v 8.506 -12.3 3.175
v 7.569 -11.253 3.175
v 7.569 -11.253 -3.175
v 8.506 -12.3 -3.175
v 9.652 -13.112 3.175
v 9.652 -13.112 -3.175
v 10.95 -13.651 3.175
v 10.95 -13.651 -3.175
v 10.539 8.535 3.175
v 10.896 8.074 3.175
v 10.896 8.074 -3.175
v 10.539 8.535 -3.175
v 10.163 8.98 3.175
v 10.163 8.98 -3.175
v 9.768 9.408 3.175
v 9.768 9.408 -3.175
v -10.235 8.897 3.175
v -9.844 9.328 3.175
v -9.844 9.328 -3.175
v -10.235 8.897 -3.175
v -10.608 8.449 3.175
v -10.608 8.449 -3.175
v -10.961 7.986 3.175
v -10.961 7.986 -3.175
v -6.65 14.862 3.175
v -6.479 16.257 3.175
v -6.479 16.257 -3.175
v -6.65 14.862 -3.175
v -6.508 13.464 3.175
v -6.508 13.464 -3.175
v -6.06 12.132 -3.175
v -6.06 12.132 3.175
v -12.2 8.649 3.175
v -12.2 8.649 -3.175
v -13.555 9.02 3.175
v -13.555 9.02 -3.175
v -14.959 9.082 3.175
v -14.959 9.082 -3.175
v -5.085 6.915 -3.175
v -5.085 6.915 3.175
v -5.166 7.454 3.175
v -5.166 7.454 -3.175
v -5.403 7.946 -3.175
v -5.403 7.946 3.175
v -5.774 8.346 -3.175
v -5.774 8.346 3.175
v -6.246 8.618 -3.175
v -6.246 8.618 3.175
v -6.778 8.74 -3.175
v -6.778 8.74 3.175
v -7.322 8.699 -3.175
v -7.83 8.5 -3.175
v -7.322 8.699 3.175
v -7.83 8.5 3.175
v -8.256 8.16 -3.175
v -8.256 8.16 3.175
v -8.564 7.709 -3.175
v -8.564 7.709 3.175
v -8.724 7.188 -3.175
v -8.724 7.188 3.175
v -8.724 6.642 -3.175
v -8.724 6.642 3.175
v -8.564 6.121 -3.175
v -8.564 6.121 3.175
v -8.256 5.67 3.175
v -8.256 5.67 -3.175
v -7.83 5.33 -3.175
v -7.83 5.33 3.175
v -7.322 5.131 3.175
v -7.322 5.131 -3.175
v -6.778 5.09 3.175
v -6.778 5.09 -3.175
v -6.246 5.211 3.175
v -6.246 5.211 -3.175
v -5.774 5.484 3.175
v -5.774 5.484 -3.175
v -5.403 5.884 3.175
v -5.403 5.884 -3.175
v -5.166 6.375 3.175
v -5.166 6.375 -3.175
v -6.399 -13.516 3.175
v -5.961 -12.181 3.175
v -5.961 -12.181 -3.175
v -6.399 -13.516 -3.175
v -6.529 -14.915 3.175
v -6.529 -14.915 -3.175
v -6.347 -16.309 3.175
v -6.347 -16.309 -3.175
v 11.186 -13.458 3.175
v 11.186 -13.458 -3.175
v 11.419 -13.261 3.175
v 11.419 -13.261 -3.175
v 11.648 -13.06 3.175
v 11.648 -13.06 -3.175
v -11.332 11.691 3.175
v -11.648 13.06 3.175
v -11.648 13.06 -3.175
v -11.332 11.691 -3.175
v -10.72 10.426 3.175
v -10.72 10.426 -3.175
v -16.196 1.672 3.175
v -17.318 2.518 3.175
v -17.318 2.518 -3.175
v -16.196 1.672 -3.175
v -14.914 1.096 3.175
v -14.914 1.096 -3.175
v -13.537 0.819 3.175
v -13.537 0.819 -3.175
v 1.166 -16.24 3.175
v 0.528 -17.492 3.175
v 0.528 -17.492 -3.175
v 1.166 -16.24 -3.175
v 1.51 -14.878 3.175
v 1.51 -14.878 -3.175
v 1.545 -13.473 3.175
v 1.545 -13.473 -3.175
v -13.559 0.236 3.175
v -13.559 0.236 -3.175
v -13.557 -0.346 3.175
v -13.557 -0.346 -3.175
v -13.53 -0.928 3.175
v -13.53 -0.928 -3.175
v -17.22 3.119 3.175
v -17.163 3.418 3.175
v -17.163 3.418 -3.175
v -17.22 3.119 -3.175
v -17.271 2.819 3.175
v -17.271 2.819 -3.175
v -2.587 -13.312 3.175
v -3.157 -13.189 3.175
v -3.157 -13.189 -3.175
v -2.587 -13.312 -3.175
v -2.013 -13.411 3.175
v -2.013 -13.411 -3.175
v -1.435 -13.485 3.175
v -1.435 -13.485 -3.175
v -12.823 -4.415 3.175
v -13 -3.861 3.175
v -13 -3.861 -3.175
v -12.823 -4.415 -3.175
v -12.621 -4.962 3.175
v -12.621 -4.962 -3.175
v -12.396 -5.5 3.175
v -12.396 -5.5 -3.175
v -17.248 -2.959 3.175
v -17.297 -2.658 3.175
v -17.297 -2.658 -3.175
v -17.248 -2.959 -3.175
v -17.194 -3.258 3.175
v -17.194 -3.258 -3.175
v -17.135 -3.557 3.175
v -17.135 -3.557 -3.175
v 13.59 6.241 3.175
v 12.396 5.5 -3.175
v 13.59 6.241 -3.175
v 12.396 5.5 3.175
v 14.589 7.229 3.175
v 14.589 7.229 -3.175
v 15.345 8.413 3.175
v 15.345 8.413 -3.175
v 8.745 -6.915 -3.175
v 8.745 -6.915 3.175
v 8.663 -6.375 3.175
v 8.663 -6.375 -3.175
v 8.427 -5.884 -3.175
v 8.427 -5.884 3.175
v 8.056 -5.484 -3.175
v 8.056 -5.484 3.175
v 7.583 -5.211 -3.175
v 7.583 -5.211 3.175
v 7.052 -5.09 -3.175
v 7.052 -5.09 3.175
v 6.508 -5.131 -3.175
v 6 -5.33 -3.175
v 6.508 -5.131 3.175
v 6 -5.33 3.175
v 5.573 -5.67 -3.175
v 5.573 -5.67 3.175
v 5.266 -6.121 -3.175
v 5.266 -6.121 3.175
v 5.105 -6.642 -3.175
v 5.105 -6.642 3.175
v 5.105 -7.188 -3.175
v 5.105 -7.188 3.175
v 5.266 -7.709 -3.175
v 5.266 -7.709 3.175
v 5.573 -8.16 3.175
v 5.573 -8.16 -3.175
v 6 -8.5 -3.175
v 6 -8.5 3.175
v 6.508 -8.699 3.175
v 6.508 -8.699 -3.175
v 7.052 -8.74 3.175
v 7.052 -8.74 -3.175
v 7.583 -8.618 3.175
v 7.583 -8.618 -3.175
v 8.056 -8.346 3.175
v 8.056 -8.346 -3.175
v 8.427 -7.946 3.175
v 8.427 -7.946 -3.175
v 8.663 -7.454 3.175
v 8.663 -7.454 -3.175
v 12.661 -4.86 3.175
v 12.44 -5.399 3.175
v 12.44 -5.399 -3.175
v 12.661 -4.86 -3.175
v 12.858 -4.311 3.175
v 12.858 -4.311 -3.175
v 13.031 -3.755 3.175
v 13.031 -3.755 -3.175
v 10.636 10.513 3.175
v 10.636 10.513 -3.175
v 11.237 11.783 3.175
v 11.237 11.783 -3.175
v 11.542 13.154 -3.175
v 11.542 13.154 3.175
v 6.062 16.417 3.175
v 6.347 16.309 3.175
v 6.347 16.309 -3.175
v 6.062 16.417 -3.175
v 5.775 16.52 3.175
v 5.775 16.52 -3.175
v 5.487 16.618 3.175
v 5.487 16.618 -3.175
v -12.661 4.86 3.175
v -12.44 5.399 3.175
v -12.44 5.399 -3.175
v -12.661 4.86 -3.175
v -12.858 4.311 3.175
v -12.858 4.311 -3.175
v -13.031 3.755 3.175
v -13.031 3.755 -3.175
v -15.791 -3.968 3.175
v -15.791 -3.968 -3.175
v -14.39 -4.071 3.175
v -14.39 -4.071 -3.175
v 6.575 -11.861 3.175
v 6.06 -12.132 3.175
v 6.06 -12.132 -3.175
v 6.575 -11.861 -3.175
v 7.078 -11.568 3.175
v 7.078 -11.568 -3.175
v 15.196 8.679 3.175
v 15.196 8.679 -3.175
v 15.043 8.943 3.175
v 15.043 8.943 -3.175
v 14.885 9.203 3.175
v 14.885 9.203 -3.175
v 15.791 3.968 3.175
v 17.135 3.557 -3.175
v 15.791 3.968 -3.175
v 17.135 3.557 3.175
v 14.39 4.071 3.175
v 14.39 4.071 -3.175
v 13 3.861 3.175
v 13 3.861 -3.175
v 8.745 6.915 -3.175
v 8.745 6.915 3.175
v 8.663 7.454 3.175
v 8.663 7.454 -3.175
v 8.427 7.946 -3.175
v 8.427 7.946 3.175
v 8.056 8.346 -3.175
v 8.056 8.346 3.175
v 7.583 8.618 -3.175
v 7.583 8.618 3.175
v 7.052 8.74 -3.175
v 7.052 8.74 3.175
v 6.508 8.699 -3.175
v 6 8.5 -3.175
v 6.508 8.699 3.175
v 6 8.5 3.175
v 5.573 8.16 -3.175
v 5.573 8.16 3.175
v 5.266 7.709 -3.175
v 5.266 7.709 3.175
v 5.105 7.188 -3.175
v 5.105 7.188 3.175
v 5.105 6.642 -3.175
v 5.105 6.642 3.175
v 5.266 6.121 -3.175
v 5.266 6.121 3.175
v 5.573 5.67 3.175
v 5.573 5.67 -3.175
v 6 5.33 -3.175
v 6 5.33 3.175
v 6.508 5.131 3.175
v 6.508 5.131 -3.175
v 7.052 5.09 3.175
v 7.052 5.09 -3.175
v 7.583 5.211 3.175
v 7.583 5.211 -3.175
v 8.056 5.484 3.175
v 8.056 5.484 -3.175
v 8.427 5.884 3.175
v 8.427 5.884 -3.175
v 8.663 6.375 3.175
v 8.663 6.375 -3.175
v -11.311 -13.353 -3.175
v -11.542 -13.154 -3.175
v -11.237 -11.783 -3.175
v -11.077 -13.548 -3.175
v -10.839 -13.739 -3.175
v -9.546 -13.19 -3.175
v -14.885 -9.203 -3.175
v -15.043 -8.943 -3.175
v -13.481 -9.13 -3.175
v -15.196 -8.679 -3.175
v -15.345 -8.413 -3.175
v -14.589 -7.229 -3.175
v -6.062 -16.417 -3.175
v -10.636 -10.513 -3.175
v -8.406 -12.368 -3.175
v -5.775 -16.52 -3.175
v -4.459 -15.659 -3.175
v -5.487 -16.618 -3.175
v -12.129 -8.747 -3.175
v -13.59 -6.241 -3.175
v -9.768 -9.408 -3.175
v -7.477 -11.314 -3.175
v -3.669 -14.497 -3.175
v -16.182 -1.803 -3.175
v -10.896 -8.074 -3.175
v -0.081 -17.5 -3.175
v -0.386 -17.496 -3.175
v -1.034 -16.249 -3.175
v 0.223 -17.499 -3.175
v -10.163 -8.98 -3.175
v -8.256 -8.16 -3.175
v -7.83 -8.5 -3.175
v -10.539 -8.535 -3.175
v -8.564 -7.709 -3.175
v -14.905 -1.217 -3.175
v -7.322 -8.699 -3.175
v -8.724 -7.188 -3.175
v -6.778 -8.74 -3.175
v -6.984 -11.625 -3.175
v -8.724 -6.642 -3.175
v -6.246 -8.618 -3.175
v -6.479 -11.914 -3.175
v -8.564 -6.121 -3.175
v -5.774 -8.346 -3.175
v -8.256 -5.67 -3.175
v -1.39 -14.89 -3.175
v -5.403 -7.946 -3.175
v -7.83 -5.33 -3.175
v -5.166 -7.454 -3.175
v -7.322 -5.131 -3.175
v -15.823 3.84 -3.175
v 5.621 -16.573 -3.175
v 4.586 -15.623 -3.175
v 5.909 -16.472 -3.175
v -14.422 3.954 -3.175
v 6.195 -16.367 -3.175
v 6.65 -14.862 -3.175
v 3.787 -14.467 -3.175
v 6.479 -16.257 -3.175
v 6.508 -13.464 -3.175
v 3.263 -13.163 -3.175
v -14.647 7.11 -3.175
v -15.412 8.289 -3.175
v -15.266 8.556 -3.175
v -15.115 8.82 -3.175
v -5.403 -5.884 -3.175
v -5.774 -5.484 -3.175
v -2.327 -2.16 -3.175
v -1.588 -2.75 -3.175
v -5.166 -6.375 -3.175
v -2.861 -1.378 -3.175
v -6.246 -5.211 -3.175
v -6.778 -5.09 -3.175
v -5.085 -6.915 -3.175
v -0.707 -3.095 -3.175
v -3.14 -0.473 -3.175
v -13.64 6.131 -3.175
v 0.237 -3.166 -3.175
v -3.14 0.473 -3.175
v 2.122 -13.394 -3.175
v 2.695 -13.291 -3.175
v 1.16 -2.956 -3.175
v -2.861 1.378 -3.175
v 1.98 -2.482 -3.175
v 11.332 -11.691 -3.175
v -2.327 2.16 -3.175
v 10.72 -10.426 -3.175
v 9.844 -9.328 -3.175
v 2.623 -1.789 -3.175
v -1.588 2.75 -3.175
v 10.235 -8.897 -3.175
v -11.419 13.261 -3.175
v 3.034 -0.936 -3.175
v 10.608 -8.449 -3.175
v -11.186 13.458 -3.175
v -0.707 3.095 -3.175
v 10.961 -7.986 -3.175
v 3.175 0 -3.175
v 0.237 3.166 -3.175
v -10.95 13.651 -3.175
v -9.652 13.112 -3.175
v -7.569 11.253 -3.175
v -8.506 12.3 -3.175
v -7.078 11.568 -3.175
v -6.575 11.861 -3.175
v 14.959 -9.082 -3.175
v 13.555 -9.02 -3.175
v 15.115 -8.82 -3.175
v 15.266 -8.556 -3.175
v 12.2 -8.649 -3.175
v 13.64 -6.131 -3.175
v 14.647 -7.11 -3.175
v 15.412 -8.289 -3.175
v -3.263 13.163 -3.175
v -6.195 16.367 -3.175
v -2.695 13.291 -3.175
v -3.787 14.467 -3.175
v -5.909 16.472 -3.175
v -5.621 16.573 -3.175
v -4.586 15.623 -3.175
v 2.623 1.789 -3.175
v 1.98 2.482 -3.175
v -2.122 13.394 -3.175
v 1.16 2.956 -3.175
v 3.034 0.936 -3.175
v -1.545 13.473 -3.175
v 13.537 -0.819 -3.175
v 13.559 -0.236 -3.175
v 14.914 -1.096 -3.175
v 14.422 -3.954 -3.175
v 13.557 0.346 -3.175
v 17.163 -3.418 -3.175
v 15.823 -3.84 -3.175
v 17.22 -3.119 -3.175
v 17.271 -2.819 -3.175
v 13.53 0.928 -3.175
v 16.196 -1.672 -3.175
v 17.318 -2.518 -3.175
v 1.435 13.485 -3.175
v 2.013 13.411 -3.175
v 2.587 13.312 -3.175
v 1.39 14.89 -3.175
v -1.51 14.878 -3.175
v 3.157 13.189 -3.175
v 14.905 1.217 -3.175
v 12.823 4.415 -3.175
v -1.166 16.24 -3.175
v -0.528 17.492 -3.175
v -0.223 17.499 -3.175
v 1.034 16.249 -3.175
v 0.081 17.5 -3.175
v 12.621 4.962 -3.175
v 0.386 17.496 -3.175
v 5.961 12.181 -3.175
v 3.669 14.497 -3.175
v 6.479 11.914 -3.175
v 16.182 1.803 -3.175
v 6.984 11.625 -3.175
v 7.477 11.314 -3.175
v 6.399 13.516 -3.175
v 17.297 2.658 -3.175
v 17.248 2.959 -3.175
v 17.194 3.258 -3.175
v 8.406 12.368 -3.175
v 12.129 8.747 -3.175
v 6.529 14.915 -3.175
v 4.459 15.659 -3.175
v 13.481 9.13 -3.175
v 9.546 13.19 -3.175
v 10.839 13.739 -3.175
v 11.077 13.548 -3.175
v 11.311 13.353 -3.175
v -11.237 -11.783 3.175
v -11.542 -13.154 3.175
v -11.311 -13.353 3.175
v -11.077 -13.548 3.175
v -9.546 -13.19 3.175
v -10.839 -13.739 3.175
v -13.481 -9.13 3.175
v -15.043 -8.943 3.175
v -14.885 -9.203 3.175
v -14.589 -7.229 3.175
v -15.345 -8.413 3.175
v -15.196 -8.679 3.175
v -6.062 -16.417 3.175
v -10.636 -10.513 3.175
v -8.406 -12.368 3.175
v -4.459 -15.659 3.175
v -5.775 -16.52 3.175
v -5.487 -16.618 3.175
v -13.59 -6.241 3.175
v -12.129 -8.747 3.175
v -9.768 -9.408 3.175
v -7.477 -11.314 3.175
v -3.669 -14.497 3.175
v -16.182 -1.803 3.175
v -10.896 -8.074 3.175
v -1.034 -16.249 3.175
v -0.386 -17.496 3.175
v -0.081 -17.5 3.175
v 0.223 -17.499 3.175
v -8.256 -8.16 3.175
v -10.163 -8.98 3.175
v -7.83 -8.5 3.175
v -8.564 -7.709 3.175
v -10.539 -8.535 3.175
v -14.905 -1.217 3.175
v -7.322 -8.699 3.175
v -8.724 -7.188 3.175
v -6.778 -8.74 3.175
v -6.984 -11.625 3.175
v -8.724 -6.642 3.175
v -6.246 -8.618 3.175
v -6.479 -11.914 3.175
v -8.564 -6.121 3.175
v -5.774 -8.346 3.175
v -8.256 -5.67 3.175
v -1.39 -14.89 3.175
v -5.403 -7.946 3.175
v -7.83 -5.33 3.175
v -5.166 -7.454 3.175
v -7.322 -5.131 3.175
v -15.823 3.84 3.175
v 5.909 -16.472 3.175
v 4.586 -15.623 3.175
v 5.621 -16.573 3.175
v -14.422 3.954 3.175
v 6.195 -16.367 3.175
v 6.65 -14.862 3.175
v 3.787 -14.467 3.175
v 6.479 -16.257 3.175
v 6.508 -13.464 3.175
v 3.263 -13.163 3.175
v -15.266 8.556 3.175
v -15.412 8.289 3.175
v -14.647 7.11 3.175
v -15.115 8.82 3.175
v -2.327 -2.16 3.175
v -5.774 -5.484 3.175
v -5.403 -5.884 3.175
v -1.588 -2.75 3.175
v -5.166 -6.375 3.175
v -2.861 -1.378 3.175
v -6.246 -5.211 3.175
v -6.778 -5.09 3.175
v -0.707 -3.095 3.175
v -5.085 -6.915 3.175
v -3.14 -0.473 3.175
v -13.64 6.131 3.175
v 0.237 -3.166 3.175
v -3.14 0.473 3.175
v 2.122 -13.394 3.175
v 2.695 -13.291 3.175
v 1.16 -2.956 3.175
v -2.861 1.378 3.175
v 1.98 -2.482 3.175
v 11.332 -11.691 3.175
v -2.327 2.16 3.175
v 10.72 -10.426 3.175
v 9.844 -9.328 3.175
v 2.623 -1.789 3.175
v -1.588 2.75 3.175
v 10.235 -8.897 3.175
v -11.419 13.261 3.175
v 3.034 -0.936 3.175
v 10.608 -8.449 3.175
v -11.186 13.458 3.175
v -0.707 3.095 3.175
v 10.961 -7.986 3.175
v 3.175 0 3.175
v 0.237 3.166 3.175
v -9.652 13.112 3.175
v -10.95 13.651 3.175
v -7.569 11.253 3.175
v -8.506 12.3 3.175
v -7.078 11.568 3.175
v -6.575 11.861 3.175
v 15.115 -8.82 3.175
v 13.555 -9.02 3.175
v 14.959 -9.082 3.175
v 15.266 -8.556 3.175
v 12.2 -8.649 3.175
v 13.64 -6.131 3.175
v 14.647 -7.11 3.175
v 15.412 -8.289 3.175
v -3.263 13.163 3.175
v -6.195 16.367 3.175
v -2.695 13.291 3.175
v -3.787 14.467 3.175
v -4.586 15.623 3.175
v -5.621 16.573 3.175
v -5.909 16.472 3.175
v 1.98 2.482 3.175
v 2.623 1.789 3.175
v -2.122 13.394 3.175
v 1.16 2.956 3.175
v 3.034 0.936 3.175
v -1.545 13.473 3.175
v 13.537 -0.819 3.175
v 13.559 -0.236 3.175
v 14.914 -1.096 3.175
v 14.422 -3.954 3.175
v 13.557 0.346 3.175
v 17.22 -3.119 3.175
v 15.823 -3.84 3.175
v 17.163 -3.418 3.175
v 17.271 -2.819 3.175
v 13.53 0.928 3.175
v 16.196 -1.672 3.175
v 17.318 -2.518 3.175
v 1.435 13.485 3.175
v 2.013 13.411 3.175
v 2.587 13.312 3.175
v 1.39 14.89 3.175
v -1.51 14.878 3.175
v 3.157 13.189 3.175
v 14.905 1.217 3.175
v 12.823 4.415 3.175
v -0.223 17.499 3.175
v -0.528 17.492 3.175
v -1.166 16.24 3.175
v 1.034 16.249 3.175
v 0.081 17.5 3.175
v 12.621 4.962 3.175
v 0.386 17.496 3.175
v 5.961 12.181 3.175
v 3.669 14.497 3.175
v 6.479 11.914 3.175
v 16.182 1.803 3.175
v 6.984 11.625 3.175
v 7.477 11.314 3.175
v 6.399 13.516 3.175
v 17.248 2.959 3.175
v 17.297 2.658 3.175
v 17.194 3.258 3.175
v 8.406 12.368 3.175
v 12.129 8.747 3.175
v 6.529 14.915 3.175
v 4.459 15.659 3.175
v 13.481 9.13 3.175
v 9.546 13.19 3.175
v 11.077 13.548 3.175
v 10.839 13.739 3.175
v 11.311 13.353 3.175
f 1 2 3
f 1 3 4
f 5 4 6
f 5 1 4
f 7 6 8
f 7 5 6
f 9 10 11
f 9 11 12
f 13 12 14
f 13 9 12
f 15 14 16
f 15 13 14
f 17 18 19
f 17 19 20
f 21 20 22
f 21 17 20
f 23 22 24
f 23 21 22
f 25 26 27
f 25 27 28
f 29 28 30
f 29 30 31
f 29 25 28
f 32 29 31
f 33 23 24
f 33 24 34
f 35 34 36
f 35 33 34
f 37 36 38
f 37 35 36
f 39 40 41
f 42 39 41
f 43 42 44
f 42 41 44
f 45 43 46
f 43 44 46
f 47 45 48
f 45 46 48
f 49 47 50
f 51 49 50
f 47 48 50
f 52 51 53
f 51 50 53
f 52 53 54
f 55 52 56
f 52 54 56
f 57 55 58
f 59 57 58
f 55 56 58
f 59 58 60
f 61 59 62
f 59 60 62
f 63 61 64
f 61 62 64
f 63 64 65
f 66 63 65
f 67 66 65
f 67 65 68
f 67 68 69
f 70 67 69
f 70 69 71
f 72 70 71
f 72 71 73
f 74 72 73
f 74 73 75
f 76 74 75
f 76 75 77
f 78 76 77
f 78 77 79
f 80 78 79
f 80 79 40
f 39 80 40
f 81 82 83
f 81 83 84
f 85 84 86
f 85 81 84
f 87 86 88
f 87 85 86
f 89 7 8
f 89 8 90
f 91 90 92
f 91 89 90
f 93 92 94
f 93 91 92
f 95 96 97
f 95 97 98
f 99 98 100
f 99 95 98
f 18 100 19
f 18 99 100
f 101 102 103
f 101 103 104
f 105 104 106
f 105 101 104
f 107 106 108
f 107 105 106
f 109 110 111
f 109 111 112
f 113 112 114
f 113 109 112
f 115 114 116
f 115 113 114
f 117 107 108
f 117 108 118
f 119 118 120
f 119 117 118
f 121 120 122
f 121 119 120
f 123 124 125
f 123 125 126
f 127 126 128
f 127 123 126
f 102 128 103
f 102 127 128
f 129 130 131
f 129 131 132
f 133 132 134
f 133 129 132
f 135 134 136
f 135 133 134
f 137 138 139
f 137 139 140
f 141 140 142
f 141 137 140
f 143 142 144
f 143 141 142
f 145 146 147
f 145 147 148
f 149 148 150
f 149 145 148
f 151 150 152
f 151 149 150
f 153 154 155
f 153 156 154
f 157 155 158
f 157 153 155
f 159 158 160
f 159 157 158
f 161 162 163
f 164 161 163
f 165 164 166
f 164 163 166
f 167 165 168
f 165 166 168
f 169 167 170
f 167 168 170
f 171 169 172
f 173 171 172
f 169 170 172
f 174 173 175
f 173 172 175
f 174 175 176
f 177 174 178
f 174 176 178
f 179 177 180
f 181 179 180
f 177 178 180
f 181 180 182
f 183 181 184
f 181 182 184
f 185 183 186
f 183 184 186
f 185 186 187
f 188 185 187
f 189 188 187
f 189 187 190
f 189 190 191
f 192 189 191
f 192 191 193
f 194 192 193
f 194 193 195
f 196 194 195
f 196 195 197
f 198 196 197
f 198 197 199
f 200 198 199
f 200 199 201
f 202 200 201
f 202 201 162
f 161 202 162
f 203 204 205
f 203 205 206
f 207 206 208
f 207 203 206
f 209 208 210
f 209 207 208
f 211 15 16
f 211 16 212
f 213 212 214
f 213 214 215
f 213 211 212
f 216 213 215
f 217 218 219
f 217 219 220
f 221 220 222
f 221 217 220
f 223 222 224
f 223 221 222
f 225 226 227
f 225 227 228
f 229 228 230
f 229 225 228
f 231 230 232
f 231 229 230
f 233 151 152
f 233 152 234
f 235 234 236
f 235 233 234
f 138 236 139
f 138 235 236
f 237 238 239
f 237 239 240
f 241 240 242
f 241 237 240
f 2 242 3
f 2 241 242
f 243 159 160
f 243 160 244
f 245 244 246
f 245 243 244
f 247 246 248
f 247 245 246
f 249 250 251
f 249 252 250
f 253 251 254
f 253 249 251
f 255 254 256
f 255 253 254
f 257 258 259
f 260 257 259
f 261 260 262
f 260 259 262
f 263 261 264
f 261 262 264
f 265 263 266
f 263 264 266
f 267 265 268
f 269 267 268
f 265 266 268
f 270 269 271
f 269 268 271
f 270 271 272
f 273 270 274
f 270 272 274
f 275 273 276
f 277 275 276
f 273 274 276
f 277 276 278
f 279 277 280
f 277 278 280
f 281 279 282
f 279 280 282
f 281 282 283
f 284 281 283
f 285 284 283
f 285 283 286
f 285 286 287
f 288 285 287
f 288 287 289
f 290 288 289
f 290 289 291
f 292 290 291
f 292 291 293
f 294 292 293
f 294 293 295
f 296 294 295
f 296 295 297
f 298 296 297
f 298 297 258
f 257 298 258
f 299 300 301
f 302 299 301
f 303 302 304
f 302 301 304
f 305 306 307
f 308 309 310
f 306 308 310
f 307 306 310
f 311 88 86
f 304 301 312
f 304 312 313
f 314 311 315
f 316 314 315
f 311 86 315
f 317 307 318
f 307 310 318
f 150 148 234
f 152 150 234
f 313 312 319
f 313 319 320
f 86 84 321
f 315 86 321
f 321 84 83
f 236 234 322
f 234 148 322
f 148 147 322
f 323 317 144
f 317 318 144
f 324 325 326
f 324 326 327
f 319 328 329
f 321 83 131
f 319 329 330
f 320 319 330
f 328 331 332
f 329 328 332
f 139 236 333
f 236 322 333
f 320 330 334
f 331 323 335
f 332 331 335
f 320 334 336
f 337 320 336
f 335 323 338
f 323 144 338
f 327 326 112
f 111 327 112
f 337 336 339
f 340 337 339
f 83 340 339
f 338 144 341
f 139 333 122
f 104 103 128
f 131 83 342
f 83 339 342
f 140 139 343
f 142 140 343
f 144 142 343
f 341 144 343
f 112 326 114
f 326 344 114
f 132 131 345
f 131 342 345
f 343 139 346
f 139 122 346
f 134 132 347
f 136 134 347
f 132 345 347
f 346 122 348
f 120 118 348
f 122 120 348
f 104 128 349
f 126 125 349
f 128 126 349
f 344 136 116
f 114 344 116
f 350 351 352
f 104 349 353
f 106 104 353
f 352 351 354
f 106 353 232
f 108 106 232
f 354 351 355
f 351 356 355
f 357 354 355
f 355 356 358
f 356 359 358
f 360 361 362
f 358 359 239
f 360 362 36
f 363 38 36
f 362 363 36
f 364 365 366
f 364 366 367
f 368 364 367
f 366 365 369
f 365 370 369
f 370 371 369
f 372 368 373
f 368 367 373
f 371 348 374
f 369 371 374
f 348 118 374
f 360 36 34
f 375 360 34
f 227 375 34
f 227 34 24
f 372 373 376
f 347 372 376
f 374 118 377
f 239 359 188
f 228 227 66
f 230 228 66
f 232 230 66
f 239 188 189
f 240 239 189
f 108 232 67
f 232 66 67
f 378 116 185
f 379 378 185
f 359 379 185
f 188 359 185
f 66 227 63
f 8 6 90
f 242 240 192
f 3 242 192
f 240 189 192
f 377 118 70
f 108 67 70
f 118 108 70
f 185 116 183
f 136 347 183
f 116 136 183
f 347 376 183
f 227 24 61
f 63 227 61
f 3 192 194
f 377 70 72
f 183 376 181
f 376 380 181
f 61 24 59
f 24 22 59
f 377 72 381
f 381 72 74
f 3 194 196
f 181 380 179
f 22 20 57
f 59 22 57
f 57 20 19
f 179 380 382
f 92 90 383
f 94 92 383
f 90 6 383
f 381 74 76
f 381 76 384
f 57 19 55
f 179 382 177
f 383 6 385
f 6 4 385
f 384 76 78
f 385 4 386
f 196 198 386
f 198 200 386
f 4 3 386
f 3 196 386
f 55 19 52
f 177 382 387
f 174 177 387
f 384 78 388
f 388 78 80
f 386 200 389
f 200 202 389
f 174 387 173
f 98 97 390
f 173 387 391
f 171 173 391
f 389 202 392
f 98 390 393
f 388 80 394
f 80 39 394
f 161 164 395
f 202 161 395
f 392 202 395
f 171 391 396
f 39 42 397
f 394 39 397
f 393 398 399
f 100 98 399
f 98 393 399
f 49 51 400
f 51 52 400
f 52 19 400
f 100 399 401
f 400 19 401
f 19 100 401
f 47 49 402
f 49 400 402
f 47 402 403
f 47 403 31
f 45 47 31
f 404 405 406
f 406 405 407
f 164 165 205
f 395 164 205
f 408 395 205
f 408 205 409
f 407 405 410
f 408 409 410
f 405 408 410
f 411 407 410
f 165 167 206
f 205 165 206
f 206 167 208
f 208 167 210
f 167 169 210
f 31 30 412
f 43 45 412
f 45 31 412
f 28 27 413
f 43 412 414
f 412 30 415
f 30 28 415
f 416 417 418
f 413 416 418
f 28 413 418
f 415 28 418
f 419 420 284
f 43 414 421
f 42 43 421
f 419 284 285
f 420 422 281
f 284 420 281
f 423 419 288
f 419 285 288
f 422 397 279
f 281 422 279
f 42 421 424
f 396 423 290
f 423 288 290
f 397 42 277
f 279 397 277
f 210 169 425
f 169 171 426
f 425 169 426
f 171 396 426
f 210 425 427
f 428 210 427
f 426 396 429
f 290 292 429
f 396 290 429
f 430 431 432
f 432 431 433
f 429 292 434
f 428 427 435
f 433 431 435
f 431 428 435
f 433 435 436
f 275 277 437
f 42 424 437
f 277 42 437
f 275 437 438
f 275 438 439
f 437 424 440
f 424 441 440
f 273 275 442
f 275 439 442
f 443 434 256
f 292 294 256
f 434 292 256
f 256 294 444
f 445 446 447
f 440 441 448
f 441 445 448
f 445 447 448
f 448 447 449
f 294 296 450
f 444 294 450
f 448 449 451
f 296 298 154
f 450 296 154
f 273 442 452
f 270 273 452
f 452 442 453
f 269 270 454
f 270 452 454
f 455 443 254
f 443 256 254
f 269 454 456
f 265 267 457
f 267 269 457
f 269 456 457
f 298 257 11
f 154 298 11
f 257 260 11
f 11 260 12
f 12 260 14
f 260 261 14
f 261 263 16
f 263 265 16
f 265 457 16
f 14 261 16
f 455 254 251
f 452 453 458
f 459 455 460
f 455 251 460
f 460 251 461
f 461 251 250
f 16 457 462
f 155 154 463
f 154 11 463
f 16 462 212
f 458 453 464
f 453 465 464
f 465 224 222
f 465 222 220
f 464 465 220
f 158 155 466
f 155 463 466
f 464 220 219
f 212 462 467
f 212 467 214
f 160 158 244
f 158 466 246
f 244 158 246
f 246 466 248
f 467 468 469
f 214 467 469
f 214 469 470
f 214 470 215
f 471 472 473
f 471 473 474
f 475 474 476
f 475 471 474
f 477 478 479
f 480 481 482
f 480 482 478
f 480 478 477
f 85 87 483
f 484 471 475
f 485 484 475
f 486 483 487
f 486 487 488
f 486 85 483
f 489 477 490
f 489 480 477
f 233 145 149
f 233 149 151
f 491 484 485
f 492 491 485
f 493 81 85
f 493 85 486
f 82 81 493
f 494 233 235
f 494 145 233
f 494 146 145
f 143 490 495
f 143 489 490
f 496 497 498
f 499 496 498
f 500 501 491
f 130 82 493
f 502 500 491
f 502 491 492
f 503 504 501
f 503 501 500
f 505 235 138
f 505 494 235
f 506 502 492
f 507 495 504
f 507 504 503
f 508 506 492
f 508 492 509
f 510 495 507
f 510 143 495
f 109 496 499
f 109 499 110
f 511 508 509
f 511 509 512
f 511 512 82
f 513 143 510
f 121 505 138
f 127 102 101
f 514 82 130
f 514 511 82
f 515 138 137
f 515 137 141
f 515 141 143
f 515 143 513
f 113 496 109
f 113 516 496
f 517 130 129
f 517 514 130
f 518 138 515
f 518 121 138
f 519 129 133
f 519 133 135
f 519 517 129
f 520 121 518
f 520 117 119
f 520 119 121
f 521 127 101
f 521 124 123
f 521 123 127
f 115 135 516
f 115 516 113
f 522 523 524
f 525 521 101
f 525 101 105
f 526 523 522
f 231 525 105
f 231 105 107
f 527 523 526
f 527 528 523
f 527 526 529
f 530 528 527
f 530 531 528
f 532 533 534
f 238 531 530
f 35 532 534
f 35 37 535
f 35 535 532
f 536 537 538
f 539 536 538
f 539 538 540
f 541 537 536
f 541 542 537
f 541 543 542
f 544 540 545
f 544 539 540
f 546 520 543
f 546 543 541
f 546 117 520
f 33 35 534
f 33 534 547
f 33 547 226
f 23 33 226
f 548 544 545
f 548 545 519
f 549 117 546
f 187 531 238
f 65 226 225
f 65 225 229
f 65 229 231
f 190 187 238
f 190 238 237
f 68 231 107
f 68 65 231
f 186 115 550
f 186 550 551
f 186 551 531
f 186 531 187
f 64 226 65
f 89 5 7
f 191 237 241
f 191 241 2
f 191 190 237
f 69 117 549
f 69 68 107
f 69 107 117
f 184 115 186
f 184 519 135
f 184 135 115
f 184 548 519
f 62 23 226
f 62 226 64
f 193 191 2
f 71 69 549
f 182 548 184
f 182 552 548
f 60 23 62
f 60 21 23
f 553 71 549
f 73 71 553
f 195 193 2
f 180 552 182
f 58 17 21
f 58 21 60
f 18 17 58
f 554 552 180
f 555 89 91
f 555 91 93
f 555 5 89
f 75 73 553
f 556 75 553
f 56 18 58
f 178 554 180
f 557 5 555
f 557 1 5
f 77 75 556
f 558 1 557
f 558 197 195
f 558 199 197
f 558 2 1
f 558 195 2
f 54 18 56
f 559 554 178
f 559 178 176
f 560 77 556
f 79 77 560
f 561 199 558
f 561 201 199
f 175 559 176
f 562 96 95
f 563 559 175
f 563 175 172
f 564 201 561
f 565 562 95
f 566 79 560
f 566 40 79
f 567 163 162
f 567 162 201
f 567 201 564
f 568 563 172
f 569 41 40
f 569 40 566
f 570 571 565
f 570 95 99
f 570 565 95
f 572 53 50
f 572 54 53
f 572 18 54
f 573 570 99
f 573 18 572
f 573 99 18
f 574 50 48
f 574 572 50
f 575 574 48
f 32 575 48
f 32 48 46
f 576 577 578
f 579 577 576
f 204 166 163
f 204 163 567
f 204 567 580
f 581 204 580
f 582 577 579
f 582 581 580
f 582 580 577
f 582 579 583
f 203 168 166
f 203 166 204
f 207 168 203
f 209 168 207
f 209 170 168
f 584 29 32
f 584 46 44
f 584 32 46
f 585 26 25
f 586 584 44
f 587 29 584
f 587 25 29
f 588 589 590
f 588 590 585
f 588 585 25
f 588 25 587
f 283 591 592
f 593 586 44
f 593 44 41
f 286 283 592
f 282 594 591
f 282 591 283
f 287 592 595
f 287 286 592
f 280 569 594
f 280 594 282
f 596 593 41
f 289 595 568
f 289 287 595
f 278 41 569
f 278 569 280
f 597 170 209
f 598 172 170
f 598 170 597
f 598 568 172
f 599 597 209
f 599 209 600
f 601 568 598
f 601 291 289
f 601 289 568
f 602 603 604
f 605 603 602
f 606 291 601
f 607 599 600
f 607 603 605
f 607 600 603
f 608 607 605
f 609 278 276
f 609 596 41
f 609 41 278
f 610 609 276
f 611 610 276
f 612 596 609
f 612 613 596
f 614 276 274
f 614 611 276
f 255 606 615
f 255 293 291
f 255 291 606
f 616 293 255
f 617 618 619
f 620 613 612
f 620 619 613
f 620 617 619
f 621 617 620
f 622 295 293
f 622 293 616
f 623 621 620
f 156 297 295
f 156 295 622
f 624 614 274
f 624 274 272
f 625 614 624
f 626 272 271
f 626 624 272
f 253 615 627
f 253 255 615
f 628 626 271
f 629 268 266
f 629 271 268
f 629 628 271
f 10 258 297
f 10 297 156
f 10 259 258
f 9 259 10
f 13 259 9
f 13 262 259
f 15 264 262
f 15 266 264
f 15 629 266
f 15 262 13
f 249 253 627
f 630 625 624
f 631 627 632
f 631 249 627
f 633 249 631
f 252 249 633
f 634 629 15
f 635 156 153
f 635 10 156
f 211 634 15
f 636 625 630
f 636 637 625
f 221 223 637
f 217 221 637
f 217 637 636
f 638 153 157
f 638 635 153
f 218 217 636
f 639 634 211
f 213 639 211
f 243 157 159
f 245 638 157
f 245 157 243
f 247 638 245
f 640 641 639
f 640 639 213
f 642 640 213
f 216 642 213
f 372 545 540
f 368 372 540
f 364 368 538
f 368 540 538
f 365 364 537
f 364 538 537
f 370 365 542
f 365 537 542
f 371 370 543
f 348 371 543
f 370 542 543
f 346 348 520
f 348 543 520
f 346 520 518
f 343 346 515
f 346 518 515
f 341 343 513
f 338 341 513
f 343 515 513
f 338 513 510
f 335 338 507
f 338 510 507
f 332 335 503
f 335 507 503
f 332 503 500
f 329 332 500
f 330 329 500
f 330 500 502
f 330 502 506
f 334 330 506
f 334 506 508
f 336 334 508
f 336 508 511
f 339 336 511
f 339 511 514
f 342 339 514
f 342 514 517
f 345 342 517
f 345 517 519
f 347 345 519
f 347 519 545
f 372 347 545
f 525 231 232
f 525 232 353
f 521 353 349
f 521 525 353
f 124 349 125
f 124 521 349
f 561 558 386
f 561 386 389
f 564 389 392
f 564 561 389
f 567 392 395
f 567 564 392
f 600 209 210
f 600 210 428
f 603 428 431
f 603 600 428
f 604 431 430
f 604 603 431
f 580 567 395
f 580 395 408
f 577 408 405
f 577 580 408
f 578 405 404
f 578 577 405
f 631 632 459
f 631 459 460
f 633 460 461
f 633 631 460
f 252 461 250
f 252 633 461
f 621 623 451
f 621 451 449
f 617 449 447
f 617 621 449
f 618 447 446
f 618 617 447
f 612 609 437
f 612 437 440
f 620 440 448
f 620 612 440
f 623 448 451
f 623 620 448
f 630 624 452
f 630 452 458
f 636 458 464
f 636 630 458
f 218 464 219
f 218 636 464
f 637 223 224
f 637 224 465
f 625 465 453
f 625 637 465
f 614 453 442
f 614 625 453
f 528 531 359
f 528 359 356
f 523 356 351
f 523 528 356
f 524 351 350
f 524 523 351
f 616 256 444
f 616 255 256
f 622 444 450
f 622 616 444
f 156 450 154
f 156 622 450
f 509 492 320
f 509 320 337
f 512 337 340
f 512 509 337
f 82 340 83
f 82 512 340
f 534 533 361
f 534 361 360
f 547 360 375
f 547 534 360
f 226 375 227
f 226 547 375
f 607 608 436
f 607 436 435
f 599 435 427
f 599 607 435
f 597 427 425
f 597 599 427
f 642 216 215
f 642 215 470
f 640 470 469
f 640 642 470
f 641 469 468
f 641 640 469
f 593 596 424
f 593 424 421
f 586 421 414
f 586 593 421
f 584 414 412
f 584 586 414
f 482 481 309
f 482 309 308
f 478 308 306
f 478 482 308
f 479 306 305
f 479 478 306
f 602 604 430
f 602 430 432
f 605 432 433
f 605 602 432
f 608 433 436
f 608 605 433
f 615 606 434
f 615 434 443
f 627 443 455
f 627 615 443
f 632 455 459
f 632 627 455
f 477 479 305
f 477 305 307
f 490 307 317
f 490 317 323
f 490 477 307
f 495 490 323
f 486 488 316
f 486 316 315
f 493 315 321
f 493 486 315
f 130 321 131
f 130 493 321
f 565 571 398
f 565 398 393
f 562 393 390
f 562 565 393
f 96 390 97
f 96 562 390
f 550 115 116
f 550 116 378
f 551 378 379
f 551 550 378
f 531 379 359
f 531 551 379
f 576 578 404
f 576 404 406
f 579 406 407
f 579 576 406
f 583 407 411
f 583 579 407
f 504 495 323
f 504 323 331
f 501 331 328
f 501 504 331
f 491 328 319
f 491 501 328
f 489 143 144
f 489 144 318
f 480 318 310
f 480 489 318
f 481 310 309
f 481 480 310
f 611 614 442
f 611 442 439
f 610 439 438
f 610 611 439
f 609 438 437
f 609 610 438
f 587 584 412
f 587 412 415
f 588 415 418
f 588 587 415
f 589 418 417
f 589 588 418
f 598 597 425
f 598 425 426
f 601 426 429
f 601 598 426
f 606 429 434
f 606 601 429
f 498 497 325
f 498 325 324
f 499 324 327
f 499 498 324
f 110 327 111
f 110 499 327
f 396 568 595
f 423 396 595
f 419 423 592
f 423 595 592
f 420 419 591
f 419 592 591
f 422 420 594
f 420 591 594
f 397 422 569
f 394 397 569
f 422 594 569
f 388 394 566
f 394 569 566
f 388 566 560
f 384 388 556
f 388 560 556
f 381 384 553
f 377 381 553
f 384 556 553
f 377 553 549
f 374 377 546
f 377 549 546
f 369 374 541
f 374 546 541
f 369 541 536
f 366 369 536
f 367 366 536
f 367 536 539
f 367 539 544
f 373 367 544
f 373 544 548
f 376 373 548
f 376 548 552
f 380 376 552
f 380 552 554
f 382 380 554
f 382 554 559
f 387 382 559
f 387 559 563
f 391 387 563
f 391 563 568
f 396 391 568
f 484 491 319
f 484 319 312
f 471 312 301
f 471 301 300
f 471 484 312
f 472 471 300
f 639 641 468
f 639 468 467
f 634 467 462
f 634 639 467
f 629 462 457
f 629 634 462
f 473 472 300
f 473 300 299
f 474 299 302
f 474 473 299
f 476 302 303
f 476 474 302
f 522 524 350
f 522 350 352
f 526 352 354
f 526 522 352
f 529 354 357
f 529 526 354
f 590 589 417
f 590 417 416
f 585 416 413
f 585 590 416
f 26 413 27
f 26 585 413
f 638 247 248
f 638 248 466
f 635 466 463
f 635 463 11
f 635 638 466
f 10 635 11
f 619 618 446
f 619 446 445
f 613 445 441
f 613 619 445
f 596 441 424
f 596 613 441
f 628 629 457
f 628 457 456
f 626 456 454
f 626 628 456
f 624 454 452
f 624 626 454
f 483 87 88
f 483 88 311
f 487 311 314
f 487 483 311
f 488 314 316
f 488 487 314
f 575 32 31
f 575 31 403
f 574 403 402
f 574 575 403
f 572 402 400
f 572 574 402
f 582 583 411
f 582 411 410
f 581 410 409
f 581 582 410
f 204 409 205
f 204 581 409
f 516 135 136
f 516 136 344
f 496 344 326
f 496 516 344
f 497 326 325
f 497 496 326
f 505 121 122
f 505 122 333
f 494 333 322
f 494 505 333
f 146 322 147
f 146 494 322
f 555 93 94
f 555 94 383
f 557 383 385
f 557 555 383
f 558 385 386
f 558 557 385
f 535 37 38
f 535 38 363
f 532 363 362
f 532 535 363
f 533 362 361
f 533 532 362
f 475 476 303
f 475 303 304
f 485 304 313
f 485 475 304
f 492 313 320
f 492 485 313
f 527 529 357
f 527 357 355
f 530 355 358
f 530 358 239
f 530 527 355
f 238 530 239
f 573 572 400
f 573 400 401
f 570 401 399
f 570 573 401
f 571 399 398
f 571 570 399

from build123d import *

# Parameters (mm, degrees)
BOSS_EXTRU_1_DEPTH = 3.175
ESQUISSE2_R        = 3.175
ESQUISSE2_R_2      = 1.83
CUT_EXTRUDE1_DEPTH = 26.426049992


with BuildPart() as part:
    # Esquisse1 → Boss.-Extru.1 (new, symmetric)
    with BuildSketch(Plane.XY):
        with BuildLine():
            ThreePointArc((12.39632517, 5.499582215), (14.117106651, 6.707055833), (15.344833887, 8.413445964))
            ThreePointArc((15.344833887, 8.413445964), (15.119886604, 8.811301214), (14.884626197, 9.203146363))
            ThreePointArc((14.884626197, 9.203146363), (12.79475517, 8.97616501), (10.895903967, 8.074252844))
            ThreePointArc((10.895903967, 8.074252844), (10.353325809, 8.759162457), (9.767767389, 9.407709736))
            ThreePointArc((9.767767389, 9.407709736), (10.97179275, 11.130905713), (11.541859176, 13.154295373))
            ThreePointArc((11.541859176, 13.154295373), (11.194403365, 13.451220514), (10.839311962, 13.73897071))
            ThreePointArc((10.839311962, 13.73897071), (8.953107774, 12.81090002), (7.47724344, 11.313934452))
            ThreePointArc((7.47724344, 11.313934452), (6.733133864, 11.771966302), (5.961072705, 12.18112862))
            ThreePointArc((5.961072705, 12.18112862), (6.503118716, 14.21220409), (6.346765909, 16.308542623))
            ThreePointArc((6.346765909, 16.308542623), (5.918709868, 16.4687241), (5.486616734, 16.617672425))
            ThreePointArc((5.486616734, 16.617672425), (4.031583448, 15.100451419), (3.156717001, 13.18898859))
            ThreePointArc((3.156717001, 13.18898859), (2.300826605, 13.364897275), (1.435384677, 13.485323618))
            ThreePointArc((1.435384677, 13.485323618), (1.25007259, 15.579300904), (0.386159005, 17.495738945))
            ThreePointArc((0.386159005, 17.495738945), (-0.07086739, 17.499856508), (-0.527845446, 17.492037594))
            ThreePointArc((-0.527845446, 17.492037594), (-1.376209343, 15.568665517), (-1.544556096, 13.473256055))
            ThreePointArc((-1.544556096, 13.473256055), (-2.408994299, 13.345824393), (-3.263431928, 13.162989565))
            ThreePointArc((-3.263431928, 13.162989565), (-4.15375074, 15.067304103), (-5.621024374, 16.57269094))
            ThreePointArc((-5.621024374, 16.57269094), (-6.051896994, 16.420247951), (-6.478641676, 16.256604874))
            ThreePointArc((-6.478641676, 16.256604874), (-6.618010975, 14.159068786), (-6.059532932, 12.132449995))
            ThreePointArc((-6.059532932, 12.132449995), (-6.828254938, 11.717048125), (-7.568630479, 11.253004706))
            ThreePointArc((-7.568630479, 11.253004706), (-9.056570428, 12.737968057), (-10.950229256, 13.650731821))
            ThreePointArc((-10.950229256, 13.650731821), (-11.302978505, 13.360115154), (-11.648018105, 13.060385685))
            ThreePointArc((-11.648018105, 13.060385685), (-11.061582813, 11.041679393), (-9.843640668, 9.328291411))
            ThreePointArc((-9.843640668, 9.328291411), (-10.423927257, 8.675022928), (-10.960940493, 7.985741403))
            ThreePointArc((-10.960940493, 7.985741403), (-12.867034061, 8.872245071), (-14.958674882, 9.082292981))
            ThreePointArc((-14.958674882, 9.082292981), (-15.190753994, 8.688555294), (-15.412471643, 8.288891231))
            ThreePointArc((-15.412471643, 8.288891231), (-14.170964512, 6.592500507), (-12.440460063, 5.399003211))
            ThreePointArc((-12.440460063, 5.399003211), (-12.762320108, 4.586661936), (-13.031199317, 3.75527983))
            ThreePointArc((-13.031199317, 3.75527983), (-15.12554349, 3.93639839), (-17.16288355, 3.418395567))
            ThreePointArc((-17.16288355, 3.418395567), (-17.246300359, 2.969027437), (-17.317953638, 2.517634164))
            ThreePointArc((-17.317953638, 2.517634164), (-15.57111875, 1.348168766), (-13.536776372, 0.818515543))
            ThreePointArc((-13.536776372, 0.818515543), (-13.561388802, -0.054918177), (-13.529703184, -0.928123913))
            ThreePointArc((-13.529703184, -0.928123913), (-15.559689144, -1.474236033), (-17.296995165, -2.657810803))
            ThreePointArc((-17.296995165, -2.657810803), (-17.221688373, -3.108608947), (-17.134634839, -3.55728674))
            ThreePointArc((-17.134634839, -3.55728674), (-15.093166261, -4.058772026), (-13.00035767, -3.860697179))
            ThreePointArc((-13.00035767, -3.860697179), (-12.724753862, -4.689874348), (-12.39632517, -5.499582215))
            ThreePointArc((-12.39632517, -5.499582215), (-14.117106651, -6.707055833), (-15.344833887, -8.413445964))
            ThreePointArc((-15.344833887, -8.413445964), (-15.119886604, -8.811301214), (-14.884626197, -9.203146363))
            ThreePointArc((-14.884626197, -9.203146363), (-12.79475517, -8.97616501), (-10.895903967, -8.074252844))
            ThreePointArc((-10.895903967, -8.074252844), (-10.353325809, -8.759162457), (-9.767767389, -9.407709736))
            ThreePointArc((-9.767767389, -9.407709736), (-10.97179275, -11.130905713), (-11.541859176, -13.154295373))
            ThreePointArc((-11.541859176, -13.154295373), (-11.194403365, -13.451220514), (-10.839311962, -13.73897071))
            ThreePointArc((-10.839311962, -13.73897071), (-8.953107774, -12.81090002), (-7.47724344, -11.313934452))
            ThreePointArc((-7.47724344, -11.313934452), (-6.733133864, -11.771966302), (-5.961072705, -12.18112862))
            ThreePointArc((-5.961072705, -12.18112862), (-6.503118716, -14.21220409), (-6.346765909, -16.308542623))
            ThreePointArc((-6.346765909, -16.308542623), (-5.918709868, -16.4687241), (-5.486616734, -16.617672425))
            ThreePointArc((-5.486616734, -16.617672425), (-4.031583448, -15.100451419), (-3.156717001, -13.18898859))
            ThreePointArc((-3.156717001, -13.18898859), (-2.300826605, -13.364897275), (-1.435384677, -13.485323618))
            ThreePointArc((-1.435384677, -13.485323618), (-1.25007259, -15.579300904), (-0.386159005, -17.495738945))
            ThreePointArc((-0.386159005, -17.495738945), (0.07086739, -17.499856508), (0.527845446, -17.492037594))
            ThreePointArc((0.527845446, -17.492037594), (1.376209343, -15.568665517), (1.544556096, -13.473256055))
            ThreePointArc((1.544556096, -13.473256055), (2.408994299, -13.345824393), (3.263431928, -13.162989565))
            ThreePointArc((3.263431928, -13.162989565), (4.15375074, -15.067304103), (5.621024374, -16.57269094))
            ThreePointArc((5.621024374, -16.57269094), (6.051896994, -16.420247951), (6.478641676, -16.256604874))
            ThreePointArc((6.478641676, -16.256604874), (6.618010975, -14.159068786), (6.059532932, -12.132449995))
            ThreePointArc((6.059532932, -12.132449995), (6.828254938, -11.717048125), (7.568630479, -11.253004706))
            ThreePointArc((7.568630479, -11.253004706), (9.056570428, -12.737968057), (10.950229256, -13.650731821))
            ThreePointArc((10.950229256, -13.650731821), (11.302978505, -13.360115154), (11.648018105, -13.060385685))
            ThreePointArc((11.648018105, -13.060385685), (11.061582813, -11.041679393), (9.843640668, -9.328291411))
            ThreePointArc((9.843640668, -9.328291411), (10.423927257, -8.675022928), (10.960940493, -7.985741403))
            ThreePointArc((10.960940493, -7.985741403), (12.867034061, -8.872245071), (14.958674882, -9.082292981))
            ThreePointArc((14.958674882, -9.082292981), (15.190753994, -8.688555294), (15.412471643, -8.288891231))
            ThreePointArc((15.412471643, -8.288891231), (14.170964512, -6.592500507), (12.440460063, -5.399003211))
            ThreePointArc((12.440460063, -5.399003211), (12.762320108, -4.586661936), (13.031199317, -3.75527983))
            ThreePointArc((13.031199317, -3.75527983), (15.12554349, -3.93639839), (17.16288355, -3.418395567))
            ThreePointArc((17.16288355, -3.418395567), (17.246300359, -2.969027437), (17.317953638, -2.517634164))
            ThreePointArc((17.317953638, -2.517634164), (15.57111875, -1.348168766), (13.536776372, -0.818515543))
            ThreePointArc((13.536776372, -0.818515543), (13.561388802, 0.054918177), (13.529703184, 0.928123913))
            ThreePointArc((13.529703184, 0.928123913), (15.559689144, 1.474236033), (17.296995165, 2.657810803))
            ThreePointArc((17.296995165, 2.657810803), (17.221688373, 3.108608947), (17.134634839, 3.55728674))
            ThreePointArc((17.134634839, 3.55728674), (15.093166261, 4.058772026), (13.00035767, 3.860697179))
            ThreePointArc((13.00035767, 3.860697179), (12.724753862, 4.689874348), (12.39632517, 5.499582215))
        make_face()
    extrude(amount=BOSS_EXTRU_1_DEPTH, both=True)

    # Esquisse2 → Cut-Extrude1 (cut, through all)
    with BuildSketch(Plane.XY.offset(3.175)):
        Circle(ESQUISSE2_R)
        with Locations((6.914797213, 6.914797213)):
            Circle(ESQUISSE2_R_2)
        with Locations((6.914797213, -6.914797213)):
            Circle(ESQUISSE2_R_2)
        with Locations((-6.914797213, -6.914797213)):
            Circle(ESQUISSE2_R_2)
        with Locations((-6.914797213, 6.914797213)):
            Circle(ESQUISSE2_R_2)
    extrude(amount=-CUT_EXTRUDE1_DEPTH, mode=Mode.SUBTRACT)


solid = part.part
